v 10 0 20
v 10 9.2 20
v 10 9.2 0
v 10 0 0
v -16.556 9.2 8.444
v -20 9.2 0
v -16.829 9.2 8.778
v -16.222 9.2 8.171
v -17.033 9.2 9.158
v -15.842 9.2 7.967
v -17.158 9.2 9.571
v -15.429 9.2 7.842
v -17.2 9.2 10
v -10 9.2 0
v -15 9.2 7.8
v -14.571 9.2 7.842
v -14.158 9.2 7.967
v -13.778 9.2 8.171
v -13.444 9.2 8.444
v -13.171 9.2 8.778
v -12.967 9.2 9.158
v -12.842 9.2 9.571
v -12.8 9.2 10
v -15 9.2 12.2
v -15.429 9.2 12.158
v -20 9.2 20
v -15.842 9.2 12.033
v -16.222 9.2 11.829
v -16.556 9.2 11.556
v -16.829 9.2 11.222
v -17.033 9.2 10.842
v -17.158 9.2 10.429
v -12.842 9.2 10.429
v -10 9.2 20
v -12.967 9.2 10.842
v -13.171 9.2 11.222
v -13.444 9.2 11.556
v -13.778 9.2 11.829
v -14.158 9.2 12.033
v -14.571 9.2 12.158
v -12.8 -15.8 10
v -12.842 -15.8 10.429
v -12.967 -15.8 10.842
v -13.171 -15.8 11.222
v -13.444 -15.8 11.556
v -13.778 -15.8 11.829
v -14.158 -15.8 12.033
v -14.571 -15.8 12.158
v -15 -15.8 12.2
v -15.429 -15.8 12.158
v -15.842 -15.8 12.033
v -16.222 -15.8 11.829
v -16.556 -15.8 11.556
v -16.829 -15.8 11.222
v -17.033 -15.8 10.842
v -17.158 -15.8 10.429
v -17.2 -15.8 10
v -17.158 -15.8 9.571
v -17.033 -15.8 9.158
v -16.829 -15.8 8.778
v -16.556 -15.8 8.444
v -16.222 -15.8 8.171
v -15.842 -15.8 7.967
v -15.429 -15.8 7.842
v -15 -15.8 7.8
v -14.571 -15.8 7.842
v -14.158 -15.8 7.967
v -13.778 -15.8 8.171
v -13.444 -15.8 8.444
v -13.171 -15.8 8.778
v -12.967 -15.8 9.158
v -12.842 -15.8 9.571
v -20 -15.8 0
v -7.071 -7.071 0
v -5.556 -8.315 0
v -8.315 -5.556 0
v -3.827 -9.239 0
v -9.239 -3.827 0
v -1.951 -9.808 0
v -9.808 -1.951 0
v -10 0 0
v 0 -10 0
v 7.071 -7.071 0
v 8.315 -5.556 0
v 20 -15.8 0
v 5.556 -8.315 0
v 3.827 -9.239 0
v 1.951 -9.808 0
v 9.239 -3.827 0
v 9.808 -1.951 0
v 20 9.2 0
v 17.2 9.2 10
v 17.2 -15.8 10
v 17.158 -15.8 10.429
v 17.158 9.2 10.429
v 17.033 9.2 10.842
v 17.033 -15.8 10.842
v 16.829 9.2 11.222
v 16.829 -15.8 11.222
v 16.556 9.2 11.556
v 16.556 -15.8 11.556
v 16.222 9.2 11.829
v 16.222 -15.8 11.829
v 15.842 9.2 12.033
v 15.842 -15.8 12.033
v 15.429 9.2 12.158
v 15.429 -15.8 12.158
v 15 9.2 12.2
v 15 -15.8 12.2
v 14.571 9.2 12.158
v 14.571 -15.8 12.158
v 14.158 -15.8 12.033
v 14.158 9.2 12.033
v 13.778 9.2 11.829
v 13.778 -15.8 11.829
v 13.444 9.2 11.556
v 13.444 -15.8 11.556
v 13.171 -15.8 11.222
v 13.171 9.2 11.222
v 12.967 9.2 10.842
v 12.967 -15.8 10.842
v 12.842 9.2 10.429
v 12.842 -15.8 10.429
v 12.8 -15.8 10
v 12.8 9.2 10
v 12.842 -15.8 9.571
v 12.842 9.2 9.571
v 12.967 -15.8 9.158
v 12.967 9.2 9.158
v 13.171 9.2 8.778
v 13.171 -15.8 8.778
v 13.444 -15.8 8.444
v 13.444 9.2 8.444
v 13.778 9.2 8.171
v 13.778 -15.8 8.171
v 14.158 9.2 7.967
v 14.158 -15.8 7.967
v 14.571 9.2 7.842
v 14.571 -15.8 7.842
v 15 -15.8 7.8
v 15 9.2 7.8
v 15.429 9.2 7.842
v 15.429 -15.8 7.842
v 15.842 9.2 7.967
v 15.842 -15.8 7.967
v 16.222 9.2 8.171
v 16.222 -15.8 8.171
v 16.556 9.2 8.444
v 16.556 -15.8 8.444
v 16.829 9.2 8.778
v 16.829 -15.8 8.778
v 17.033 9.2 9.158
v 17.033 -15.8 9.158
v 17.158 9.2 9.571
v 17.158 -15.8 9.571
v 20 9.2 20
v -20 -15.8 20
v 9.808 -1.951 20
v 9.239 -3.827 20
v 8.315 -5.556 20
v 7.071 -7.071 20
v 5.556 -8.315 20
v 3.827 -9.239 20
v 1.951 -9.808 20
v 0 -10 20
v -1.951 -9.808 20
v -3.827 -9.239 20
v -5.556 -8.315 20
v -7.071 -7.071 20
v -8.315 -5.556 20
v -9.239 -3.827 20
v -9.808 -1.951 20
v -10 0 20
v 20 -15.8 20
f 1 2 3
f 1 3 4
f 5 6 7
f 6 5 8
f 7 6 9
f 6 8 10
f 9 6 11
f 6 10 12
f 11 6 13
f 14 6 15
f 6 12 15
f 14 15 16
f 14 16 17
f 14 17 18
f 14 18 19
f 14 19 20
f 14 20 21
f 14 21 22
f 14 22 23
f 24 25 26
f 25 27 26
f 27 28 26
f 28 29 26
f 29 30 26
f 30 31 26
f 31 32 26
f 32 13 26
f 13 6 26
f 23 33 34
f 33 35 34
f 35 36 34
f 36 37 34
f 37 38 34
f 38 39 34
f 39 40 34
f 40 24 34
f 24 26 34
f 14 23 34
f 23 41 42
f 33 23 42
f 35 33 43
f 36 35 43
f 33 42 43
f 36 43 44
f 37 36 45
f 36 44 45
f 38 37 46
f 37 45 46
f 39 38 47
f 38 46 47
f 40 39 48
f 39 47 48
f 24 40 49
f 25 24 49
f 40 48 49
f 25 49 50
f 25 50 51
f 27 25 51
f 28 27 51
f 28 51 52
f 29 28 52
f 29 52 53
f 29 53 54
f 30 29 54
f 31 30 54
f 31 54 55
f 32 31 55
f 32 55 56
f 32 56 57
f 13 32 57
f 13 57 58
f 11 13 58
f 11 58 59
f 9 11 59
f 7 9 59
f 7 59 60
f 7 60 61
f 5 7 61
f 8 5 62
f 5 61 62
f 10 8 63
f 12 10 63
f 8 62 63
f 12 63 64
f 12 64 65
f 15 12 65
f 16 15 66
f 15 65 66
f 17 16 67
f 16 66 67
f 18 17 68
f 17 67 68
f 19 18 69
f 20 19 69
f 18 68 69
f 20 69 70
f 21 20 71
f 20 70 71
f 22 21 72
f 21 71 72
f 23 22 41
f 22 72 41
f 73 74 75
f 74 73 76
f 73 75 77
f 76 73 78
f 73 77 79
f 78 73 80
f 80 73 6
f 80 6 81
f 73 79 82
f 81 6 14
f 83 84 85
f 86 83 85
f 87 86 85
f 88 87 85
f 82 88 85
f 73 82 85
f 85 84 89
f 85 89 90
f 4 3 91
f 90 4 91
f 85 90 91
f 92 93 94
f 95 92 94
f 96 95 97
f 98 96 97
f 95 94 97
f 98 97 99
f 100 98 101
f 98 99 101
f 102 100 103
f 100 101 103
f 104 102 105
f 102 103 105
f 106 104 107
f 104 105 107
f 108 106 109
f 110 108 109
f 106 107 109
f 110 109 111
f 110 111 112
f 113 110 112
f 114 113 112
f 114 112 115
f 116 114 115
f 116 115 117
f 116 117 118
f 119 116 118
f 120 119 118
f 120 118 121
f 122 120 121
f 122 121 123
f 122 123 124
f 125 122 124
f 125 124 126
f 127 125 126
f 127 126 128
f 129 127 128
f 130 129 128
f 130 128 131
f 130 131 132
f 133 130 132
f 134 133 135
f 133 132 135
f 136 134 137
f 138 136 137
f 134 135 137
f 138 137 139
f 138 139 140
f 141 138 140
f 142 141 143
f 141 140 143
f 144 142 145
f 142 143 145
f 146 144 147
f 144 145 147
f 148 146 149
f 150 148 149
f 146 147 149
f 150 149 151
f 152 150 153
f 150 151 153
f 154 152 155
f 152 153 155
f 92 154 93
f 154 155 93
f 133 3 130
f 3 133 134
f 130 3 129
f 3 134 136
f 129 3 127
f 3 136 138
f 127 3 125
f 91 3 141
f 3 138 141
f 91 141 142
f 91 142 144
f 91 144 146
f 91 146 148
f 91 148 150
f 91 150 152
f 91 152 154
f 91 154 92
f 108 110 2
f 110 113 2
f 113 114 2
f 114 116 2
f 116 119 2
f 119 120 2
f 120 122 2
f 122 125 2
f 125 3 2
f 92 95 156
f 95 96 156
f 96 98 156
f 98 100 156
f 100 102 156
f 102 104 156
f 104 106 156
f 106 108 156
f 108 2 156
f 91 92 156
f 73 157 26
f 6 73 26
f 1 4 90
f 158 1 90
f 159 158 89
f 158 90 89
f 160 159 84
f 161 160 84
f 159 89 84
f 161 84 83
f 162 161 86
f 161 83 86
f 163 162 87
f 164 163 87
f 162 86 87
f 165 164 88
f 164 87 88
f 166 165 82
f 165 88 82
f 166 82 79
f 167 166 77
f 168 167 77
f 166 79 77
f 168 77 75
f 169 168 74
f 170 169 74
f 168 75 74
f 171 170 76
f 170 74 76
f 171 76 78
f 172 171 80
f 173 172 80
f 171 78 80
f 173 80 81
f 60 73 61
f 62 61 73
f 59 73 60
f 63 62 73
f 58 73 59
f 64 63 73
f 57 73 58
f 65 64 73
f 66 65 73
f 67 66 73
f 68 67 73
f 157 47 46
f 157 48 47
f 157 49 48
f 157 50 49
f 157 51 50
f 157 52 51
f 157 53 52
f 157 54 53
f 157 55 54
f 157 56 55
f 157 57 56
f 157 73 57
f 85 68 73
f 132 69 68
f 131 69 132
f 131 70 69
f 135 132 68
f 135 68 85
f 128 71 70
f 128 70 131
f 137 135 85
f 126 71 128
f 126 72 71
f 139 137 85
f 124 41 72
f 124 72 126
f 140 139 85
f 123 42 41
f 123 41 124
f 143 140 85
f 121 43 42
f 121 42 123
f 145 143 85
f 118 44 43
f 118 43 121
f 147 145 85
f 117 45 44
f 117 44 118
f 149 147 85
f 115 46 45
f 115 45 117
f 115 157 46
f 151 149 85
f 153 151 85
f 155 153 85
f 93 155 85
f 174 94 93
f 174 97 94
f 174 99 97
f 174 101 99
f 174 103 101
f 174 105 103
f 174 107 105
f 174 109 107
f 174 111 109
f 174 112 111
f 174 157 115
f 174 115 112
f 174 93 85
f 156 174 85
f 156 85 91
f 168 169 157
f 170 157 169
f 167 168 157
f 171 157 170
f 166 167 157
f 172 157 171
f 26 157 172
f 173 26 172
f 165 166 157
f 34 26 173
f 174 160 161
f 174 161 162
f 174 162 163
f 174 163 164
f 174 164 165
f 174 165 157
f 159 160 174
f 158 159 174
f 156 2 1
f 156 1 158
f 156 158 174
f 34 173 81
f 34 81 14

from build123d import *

# Parameters (mm, degrees)
SKETCH1_W           = 40
SKETCH1_H           = 25
BOSS_EXTRUDE1_DEPTH = 20
CUT_EXTRUDE1_DEPTH  = 33.398148095
HOLE1_D             = 4.4
HOLE2_D             = 4.4


with BuildPart() as part:
    # Sketch1 → Boss-Extrude1 (new body)
    with BuildSketch(Plane.XY.offset(20)):
        with Locations((0, -3.3)):
            Rectangle(SKETCH1_W, SKETCH1_H)
    extrude(amount=-BOSS_EXTRUDE1_DEPTH)

    # Sketch2 → Cut-Extrude1 (cut, through all)
    with BuildSketch(Plane(origin=(0, 0, 0), x_dir=(-1, 0, 0), z_dir=(0, 0, -1))):
        with BuildLine():
            Line((10, 9.2), (-10, 9.2))
            Line((-10, 9.2), (-10, 0))
            ThreePointArc((-10, 0), (0, -10), (10, 0))
            Line((10, 0), (10, 9.2))
        make_face()
    extrude(amount=-CUT_EXTRUDE1_DEPTH, mode=Mode.SUBTRACT)

    # Hole1 (through all)
    with Locations(Plane(origin=(0, 9.2, 0), x_dir=(-1, 0, 0), z_dir=(0, 1, 0))):
        with Locations((15, 10)):
            Hole(HOLE1_D / 2)

    # Hole2 (through all)
    with Locations(Plane(origin=(0, 9.2, 0), x_dir=(-1, 0, 0), z_dir=(0, 1, 0))):
        with Locations((-15, 10)):
            Hole(HOLE2_D / 2)


solid = part.part
